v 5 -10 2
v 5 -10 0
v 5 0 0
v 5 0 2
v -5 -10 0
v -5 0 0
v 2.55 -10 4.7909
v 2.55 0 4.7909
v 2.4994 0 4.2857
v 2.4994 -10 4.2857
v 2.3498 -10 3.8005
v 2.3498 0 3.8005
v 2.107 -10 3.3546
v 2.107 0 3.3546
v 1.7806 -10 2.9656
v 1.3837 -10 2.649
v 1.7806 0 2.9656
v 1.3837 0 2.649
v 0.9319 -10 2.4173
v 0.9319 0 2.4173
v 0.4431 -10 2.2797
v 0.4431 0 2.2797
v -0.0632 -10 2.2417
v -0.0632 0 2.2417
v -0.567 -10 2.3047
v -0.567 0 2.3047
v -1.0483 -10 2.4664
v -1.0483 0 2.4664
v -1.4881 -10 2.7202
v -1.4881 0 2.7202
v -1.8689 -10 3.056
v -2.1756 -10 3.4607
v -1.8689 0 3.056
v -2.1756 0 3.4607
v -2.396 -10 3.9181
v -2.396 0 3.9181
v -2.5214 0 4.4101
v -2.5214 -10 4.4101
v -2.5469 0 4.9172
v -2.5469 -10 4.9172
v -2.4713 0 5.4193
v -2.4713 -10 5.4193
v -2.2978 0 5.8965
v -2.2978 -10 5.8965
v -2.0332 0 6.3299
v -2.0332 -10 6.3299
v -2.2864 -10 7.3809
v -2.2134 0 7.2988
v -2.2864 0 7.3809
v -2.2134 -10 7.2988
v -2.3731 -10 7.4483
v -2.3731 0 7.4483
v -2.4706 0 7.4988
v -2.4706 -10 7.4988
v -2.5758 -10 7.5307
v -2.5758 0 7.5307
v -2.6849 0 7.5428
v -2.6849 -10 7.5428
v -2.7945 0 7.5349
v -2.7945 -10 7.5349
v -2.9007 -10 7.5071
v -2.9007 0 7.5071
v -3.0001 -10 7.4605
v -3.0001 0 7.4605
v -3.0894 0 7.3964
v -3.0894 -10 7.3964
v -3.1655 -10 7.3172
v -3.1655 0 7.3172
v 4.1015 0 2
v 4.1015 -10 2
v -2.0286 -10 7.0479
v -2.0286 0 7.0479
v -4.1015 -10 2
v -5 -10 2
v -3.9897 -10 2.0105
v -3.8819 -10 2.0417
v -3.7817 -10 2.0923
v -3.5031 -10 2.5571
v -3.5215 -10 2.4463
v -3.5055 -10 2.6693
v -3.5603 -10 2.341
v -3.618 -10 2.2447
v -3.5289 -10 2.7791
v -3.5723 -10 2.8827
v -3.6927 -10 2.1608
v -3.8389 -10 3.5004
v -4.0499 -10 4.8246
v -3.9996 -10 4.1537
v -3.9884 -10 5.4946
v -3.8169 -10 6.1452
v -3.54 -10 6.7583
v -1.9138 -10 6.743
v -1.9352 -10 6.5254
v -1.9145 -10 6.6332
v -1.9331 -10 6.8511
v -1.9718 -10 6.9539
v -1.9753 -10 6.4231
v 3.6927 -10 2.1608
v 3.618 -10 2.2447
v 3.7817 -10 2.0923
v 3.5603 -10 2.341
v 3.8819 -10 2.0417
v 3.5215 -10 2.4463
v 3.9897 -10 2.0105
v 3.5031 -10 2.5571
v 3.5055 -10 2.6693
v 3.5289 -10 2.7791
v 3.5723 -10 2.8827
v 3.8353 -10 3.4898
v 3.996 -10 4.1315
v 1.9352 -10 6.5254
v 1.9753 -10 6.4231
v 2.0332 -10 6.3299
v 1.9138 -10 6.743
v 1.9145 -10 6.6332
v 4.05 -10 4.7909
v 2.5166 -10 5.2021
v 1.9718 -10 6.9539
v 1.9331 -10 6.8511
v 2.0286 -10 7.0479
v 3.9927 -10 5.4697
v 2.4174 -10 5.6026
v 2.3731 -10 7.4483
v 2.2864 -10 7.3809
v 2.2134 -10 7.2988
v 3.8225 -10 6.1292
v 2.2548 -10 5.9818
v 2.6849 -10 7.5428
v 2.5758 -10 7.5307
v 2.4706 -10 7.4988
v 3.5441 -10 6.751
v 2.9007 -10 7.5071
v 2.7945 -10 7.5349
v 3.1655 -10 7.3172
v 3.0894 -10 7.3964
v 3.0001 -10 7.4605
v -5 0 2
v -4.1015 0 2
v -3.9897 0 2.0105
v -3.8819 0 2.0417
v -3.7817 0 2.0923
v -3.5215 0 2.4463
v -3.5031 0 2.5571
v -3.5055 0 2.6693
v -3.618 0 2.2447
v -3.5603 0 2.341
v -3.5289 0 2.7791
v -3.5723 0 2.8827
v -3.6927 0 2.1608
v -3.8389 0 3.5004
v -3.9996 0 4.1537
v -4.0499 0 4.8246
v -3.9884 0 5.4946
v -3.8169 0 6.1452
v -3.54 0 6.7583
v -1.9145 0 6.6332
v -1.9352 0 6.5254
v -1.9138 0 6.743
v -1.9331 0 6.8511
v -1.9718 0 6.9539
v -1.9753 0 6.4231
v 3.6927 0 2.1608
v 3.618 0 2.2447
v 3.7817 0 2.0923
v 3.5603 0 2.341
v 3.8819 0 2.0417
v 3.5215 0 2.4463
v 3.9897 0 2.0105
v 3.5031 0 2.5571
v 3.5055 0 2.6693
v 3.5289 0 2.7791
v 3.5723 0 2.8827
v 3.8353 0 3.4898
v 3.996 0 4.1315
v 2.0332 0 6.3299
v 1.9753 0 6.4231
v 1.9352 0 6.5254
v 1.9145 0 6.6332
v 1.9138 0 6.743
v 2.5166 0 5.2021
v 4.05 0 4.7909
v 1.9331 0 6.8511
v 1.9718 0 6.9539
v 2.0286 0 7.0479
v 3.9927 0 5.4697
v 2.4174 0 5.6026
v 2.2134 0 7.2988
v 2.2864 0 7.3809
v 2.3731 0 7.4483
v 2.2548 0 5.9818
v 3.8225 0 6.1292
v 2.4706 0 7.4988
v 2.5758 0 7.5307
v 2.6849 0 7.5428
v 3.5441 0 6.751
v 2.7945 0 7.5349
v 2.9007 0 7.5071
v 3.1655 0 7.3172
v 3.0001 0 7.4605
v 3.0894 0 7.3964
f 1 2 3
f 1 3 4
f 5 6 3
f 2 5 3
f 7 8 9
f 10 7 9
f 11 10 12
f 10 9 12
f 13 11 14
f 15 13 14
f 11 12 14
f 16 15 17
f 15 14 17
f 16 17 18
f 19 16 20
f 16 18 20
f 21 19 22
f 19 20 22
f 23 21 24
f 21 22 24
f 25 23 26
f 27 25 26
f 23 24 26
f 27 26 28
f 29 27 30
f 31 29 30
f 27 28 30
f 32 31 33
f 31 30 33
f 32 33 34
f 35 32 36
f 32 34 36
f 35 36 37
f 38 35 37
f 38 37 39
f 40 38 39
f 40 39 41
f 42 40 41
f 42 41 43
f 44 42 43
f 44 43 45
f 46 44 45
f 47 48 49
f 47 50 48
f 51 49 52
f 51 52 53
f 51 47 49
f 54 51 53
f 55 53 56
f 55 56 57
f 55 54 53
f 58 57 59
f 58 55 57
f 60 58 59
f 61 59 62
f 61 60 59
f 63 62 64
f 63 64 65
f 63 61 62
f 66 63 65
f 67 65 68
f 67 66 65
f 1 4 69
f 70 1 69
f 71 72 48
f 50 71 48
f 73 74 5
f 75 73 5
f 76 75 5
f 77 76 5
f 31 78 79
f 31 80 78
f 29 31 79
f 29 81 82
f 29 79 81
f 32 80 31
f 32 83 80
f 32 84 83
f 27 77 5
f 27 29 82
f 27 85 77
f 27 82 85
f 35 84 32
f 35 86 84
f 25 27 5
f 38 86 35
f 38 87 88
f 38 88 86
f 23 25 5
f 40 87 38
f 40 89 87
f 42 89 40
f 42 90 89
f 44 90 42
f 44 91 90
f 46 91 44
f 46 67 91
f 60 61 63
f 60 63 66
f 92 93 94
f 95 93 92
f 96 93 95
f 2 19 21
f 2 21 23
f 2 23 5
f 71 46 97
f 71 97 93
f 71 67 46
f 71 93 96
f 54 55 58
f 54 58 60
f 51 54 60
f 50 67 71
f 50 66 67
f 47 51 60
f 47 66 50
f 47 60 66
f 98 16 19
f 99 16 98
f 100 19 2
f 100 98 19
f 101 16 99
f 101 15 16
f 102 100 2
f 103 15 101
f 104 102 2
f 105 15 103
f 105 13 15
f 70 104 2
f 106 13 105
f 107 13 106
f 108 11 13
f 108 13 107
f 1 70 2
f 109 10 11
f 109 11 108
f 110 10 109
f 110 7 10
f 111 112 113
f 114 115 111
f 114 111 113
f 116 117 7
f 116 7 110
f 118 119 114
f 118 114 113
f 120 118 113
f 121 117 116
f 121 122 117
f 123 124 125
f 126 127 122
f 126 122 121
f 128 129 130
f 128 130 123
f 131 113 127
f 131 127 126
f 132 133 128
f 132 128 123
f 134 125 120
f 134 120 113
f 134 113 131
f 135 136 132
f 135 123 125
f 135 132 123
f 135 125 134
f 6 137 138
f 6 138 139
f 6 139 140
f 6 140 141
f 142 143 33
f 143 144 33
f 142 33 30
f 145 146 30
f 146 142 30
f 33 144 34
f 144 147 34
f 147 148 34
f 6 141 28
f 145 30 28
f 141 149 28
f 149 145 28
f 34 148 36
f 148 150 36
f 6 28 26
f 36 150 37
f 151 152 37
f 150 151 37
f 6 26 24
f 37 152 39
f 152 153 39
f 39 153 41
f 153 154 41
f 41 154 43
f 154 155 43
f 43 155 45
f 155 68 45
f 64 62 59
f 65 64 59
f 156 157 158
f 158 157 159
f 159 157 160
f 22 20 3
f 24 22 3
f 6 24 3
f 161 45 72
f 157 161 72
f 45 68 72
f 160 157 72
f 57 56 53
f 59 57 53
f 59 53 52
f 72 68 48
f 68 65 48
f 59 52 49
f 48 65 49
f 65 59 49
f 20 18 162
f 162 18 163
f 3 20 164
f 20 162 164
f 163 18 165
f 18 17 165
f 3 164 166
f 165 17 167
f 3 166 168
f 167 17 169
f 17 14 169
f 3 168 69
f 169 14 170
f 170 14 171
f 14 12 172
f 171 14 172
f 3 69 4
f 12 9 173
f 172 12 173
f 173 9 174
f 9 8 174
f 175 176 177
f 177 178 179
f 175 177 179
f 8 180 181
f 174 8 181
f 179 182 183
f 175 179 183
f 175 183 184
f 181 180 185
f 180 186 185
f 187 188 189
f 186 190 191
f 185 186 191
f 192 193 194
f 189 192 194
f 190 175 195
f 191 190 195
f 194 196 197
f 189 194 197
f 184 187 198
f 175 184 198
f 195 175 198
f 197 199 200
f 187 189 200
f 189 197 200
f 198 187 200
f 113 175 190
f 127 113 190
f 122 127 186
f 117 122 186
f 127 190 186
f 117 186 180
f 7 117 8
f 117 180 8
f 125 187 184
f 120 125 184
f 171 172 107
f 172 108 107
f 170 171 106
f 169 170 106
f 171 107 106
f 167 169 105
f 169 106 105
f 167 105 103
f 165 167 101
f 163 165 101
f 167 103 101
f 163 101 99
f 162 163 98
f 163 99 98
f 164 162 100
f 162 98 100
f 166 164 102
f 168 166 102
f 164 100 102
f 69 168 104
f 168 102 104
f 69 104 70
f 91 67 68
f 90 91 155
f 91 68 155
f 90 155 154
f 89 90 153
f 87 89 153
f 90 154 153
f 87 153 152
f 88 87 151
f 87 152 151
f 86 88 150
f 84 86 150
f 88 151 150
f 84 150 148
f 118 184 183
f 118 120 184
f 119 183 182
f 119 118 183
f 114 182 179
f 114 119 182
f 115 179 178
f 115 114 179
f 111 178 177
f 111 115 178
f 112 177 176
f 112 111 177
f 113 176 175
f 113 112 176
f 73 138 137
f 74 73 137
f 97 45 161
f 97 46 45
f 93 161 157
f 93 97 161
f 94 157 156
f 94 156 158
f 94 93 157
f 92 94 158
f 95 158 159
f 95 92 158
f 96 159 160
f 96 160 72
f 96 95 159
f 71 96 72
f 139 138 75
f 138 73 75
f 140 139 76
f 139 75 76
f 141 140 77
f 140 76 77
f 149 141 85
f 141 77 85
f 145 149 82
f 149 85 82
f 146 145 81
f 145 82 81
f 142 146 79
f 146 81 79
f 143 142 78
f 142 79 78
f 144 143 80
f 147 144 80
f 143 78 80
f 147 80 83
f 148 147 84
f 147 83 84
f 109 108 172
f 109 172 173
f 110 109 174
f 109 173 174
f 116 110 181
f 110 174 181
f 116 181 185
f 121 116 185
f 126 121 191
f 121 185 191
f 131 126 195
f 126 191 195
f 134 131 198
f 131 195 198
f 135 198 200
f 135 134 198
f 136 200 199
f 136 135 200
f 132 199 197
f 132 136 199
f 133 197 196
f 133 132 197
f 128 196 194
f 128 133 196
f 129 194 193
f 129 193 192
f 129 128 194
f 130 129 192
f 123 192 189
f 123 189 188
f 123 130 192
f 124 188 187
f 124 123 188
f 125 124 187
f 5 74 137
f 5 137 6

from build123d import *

# Parameters (mm, degrees)
F1_DEPTH = 10
F2_R     = 0.6
F3_R     = 0.6


with BuildPart() as f1:
    # F0 (on Front) → F1 (new body)
    with BuildSketch(Plane.XZ):
        with BuildLine():
            Line((2.934854861, 2), (-2.934854861, 2))
            ThreePointArc((-2.934854861, 2), (0, 0.7409007408), (2.934854861, 2))
        make_face()
        with BuildLine():
            Line((-2.934854861, 2), (-5, 2))
            Line((-5, 2), (-5, 0))
            Line((-5, 0), (5, 0))
            Line((5, 0), (5, 2))
            Line((5, 2), (2.934854861, 2))
            ThreePointArc((2.934854861, 2), (0, 0.7409007408), (-2.934854861, 2))
        make_face()
        with BuildLine():
            ThreePointArc((-2.6329280886, 7.8682680702), (-4.0446500812, 4.9990010065), (-2.934854861, 2))
            Line((-2.934854861, 2), (2.934854861, 2))
            ThreePointArc((2.934854861, 2), (3.7608949857, 3.288180239), (4.05, 4.7909007408))
            ThreePointArc((4.05, 4.7909007408), (3.6787130058, 6.4848814433), (2.6329280886, 7.8682680702))
            Line((2.6329280886, 7.8682680702), (1.7395072673, 6.6554689125))
            ThreePointArc((1.7395072673, 6.6554689125), (2.3386153523, 5.8074528714), (2.55, 4.7909007408))
            ThreePointArc((2.55, 4.7909007408), (-1.0165521306, 2.4522853885), (-1.7395072673, 6.6554689125))
            Line((-1.7395072673, 6.6554689125), (-2.6329280886, 7.8682680702))
        make_face()
    extrude(amount=F1_DEPTH)

    # F2
    f2_edges = [f1.edges().sort_by_distance(p)[0] for p in [
        (1.739507, -5, 6.655469),
        (-1.739507, -5, 6.655469),
        (-2.632928, -5, 7.868268),
        (2.632928, -5, 7.868268),
    ]]
    fillet(f2_edges, radius=F2_R)

    # F3
    f3_edges = [f1.edges().sort_by_distance(p)[0] for p in [
        (2.934855, -5, 2),
        (-2.934855, -5, 2),
    ]]
    fillet(f3_edges, radius=F3_R)


solid = f1.part
